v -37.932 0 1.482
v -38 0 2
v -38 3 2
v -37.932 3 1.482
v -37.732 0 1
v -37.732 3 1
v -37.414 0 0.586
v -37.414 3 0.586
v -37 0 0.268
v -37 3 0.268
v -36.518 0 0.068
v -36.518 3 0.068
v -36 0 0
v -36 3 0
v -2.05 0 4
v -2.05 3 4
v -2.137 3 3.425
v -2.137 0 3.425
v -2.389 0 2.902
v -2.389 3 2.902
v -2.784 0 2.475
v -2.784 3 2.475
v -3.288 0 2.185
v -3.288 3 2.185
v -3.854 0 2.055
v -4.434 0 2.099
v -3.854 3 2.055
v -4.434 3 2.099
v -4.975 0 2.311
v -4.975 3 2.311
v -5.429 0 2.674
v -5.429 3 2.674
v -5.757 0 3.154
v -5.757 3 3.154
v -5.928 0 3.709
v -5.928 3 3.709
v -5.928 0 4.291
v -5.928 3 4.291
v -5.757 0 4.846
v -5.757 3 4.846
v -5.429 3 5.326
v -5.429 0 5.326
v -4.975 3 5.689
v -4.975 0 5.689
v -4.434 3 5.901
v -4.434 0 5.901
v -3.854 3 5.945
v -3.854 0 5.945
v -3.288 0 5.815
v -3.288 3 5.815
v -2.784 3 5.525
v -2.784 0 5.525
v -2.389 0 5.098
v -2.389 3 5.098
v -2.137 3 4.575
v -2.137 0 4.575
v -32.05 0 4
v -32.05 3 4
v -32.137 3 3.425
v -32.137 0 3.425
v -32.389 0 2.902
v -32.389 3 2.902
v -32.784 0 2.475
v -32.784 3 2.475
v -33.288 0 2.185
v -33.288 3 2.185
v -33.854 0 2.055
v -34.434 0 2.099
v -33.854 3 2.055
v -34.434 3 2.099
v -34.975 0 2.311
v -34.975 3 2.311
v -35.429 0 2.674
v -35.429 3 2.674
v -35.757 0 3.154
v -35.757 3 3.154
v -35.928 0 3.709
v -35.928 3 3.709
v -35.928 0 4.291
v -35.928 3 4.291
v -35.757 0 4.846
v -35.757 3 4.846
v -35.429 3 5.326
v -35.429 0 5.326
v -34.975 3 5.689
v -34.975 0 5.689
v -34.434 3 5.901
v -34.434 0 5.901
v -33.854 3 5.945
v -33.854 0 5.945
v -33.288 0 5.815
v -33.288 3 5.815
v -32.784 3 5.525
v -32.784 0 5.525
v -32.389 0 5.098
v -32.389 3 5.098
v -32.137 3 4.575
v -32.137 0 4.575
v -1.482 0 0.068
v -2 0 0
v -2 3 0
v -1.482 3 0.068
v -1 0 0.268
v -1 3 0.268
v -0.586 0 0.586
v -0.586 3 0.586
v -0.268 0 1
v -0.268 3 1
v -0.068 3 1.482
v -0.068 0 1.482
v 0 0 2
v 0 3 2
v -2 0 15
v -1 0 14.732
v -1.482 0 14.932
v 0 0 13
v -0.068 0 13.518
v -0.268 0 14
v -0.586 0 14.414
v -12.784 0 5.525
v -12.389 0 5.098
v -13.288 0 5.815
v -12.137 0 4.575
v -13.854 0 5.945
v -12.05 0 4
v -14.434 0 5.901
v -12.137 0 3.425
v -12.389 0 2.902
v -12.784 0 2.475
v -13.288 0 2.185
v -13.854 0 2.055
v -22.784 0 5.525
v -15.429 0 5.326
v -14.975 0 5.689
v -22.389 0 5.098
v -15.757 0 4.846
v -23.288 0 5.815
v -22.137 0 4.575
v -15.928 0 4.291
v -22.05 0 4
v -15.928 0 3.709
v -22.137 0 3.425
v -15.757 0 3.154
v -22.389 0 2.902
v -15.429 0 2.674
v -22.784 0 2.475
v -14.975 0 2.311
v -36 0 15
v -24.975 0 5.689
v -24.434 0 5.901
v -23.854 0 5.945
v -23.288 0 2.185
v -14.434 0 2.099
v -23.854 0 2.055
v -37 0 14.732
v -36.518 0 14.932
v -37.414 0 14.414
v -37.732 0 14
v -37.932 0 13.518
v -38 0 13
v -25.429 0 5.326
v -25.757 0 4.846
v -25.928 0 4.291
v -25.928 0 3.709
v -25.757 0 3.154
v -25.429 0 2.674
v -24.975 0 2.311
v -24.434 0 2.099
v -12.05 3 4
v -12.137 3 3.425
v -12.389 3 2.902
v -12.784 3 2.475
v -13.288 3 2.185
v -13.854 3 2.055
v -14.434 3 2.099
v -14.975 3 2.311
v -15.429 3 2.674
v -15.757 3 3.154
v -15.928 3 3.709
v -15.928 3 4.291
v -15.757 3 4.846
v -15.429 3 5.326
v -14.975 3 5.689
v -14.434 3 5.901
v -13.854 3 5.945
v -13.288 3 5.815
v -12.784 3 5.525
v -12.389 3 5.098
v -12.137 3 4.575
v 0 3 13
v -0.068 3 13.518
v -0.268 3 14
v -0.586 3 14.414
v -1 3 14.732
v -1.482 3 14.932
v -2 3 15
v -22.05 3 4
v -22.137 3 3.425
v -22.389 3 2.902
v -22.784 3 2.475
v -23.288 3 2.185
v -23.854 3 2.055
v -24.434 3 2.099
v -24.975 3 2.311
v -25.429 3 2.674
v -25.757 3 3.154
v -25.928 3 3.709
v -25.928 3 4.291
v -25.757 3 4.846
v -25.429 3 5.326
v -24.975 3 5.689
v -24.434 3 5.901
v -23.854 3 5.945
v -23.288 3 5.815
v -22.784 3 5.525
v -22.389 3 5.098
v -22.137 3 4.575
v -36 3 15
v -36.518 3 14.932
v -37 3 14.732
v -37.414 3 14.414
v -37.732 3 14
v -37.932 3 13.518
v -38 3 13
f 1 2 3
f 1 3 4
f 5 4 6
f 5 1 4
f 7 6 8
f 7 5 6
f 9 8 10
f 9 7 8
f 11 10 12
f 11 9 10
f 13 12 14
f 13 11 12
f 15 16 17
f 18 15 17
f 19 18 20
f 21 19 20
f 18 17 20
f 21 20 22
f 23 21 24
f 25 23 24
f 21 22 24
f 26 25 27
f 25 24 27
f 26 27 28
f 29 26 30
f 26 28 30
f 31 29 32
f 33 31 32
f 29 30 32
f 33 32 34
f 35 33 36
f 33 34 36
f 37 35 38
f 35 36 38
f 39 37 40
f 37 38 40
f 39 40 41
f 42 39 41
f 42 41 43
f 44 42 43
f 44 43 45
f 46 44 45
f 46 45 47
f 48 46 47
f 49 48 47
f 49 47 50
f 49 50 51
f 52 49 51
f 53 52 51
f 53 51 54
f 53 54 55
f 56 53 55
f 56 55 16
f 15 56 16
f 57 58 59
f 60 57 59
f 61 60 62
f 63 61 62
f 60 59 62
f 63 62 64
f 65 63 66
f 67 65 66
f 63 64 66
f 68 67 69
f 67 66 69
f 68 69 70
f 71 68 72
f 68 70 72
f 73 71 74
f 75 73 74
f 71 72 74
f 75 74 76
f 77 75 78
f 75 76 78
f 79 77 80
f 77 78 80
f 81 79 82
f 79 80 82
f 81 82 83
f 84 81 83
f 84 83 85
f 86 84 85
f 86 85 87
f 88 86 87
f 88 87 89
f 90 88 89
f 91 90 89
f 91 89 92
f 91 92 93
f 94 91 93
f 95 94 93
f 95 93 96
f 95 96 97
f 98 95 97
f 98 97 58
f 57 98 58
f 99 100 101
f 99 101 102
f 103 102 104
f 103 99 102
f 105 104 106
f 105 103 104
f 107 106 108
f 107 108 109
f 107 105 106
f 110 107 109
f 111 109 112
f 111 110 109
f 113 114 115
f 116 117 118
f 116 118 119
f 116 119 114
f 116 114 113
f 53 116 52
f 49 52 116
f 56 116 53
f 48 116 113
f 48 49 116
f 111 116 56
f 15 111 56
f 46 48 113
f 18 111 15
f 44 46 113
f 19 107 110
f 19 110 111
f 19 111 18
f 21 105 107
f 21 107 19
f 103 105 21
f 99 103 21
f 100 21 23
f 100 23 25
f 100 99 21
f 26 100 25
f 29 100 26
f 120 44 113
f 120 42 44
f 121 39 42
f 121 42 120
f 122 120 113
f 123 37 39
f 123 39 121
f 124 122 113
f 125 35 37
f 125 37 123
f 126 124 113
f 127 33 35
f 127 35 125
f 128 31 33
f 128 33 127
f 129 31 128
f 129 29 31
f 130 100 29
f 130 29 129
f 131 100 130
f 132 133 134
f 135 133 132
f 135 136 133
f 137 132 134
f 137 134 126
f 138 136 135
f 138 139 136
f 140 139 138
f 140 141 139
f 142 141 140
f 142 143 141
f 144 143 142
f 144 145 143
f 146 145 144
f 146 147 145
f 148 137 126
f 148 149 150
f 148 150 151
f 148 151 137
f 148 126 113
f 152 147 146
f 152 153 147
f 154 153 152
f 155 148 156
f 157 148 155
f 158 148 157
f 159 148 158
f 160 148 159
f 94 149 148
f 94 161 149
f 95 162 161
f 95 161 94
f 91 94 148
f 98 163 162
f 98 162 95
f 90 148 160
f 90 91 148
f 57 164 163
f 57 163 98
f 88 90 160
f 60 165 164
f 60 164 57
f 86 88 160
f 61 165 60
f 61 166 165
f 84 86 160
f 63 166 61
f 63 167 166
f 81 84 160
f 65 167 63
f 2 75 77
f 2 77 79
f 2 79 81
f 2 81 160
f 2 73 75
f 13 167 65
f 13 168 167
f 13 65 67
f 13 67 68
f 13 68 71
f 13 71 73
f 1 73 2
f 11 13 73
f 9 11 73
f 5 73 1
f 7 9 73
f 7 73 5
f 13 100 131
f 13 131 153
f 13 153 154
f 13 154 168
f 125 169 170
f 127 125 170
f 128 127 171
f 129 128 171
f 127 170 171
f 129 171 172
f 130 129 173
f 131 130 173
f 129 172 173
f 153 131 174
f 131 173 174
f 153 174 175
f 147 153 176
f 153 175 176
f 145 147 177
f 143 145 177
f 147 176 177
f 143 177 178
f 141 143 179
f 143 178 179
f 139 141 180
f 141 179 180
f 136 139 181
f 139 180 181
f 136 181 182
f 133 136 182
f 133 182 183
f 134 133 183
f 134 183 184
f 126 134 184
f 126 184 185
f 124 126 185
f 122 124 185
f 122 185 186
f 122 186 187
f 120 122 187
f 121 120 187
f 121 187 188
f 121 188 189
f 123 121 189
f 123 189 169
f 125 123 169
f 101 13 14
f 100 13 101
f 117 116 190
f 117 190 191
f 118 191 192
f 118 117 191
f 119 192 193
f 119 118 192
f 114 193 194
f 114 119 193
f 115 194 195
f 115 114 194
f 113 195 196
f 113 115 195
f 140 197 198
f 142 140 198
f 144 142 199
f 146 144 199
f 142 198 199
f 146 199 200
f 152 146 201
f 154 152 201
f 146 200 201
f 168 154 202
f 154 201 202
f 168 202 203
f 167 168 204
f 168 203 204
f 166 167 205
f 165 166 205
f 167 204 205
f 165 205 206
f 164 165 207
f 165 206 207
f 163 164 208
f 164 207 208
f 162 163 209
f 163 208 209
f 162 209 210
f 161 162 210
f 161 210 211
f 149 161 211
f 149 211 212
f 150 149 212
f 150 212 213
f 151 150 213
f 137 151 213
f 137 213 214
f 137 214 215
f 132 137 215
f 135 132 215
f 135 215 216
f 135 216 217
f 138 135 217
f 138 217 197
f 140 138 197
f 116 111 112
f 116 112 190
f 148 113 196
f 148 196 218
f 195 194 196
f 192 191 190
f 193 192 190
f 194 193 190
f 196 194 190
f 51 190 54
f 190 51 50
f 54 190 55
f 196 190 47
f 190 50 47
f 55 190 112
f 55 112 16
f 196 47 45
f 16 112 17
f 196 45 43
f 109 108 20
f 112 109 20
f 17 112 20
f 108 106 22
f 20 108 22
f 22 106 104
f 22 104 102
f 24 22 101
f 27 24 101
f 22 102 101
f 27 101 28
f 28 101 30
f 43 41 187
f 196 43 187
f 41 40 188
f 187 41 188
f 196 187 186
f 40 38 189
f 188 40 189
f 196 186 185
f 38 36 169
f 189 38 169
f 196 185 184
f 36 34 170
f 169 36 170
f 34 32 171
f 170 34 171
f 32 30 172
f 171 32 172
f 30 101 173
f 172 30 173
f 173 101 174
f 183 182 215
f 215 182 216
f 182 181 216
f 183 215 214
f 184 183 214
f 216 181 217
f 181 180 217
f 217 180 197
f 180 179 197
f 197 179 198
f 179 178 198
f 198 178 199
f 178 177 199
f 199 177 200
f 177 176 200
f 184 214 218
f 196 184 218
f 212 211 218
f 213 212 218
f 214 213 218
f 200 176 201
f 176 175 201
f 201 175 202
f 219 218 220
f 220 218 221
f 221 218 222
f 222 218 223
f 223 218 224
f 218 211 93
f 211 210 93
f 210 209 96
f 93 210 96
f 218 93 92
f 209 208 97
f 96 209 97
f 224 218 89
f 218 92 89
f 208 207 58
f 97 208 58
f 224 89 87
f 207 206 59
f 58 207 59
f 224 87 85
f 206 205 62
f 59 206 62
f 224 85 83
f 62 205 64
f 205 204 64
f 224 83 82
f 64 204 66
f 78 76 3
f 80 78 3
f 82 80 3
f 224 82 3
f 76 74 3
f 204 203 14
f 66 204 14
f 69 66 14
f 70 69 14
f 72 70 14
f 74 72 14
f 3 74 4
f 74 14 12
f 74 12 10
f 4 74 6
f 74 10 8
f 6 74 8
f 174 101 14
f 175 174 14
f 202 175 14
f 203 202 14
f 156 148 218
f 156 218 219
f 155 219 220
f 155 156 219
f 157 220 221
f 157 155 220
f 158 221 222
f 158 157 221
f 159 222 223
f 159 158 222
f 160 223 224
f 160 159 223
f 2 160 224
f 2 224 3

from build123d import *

# Parameters (mm, degrees)
BOSS_EXTRUDE1_DEPTH = 3
SKETCH2_R           = 1.95
CUT_EXTRUDE1_DEPTH  = 4


with BuildPart() as part:
    # Sketch1 → Boss-Extrude1 (new body)
    with BuildSketch(Plane(origin=(0, 0, 0), x_dir=(1, 0, 0), z_dir=(0, 1, 0))):
        with BuildLine():
            Line((-36, 0), (-2, 0))
            ThreePointArc((-2, 0), (-0.585786438, -0.585786438), (0, -2))
            Line((0, -2), (0, -13))
            ThreePointArc((0, -13), (-0.585786438, -14.414213562), (-2, -15))
            Line((-2, -15), (-36, -15))
            ThreePointArc((-36, -15), (-37.414213562, -14.414213562), (-38, -13))
            Line((-38, -13), (-38, -2))
            ThreePointArc((-38, -2), (-37.414213562, -0.585786438), (-36, 0))
        make_face()
    extrude(amount=BOSS_EXTRUDE1_DEPTH)

    # Sketch2 → Cut-Extrude1 (cut, through all)
    with BuildSketch(Plane(origin=(0, 3, 0), x_dir=(1, 0, 0), z_dir=(0, 1, 0))):
        with Locations((-4, -4)):
            Circle(SKETCH2_R)
        with Locations((-14, -4)):
            Circle(SKETCH2_R)
        with Locations((-24, -4)):
            Circle(SKETCH2_R)
        with Locations((-54, -4)):
            Circle(SKETCH2_R)
        with Locations((-34, -4)):
            Circle(SKETCH2_R)
        with Locations((-44, -4)):
            Circle(SKETCH2_R)
    extrude(amount=-CUT_EXTRUDE1_DEPTH, mode=Mode.SUBTRACT)


solid = part.part
